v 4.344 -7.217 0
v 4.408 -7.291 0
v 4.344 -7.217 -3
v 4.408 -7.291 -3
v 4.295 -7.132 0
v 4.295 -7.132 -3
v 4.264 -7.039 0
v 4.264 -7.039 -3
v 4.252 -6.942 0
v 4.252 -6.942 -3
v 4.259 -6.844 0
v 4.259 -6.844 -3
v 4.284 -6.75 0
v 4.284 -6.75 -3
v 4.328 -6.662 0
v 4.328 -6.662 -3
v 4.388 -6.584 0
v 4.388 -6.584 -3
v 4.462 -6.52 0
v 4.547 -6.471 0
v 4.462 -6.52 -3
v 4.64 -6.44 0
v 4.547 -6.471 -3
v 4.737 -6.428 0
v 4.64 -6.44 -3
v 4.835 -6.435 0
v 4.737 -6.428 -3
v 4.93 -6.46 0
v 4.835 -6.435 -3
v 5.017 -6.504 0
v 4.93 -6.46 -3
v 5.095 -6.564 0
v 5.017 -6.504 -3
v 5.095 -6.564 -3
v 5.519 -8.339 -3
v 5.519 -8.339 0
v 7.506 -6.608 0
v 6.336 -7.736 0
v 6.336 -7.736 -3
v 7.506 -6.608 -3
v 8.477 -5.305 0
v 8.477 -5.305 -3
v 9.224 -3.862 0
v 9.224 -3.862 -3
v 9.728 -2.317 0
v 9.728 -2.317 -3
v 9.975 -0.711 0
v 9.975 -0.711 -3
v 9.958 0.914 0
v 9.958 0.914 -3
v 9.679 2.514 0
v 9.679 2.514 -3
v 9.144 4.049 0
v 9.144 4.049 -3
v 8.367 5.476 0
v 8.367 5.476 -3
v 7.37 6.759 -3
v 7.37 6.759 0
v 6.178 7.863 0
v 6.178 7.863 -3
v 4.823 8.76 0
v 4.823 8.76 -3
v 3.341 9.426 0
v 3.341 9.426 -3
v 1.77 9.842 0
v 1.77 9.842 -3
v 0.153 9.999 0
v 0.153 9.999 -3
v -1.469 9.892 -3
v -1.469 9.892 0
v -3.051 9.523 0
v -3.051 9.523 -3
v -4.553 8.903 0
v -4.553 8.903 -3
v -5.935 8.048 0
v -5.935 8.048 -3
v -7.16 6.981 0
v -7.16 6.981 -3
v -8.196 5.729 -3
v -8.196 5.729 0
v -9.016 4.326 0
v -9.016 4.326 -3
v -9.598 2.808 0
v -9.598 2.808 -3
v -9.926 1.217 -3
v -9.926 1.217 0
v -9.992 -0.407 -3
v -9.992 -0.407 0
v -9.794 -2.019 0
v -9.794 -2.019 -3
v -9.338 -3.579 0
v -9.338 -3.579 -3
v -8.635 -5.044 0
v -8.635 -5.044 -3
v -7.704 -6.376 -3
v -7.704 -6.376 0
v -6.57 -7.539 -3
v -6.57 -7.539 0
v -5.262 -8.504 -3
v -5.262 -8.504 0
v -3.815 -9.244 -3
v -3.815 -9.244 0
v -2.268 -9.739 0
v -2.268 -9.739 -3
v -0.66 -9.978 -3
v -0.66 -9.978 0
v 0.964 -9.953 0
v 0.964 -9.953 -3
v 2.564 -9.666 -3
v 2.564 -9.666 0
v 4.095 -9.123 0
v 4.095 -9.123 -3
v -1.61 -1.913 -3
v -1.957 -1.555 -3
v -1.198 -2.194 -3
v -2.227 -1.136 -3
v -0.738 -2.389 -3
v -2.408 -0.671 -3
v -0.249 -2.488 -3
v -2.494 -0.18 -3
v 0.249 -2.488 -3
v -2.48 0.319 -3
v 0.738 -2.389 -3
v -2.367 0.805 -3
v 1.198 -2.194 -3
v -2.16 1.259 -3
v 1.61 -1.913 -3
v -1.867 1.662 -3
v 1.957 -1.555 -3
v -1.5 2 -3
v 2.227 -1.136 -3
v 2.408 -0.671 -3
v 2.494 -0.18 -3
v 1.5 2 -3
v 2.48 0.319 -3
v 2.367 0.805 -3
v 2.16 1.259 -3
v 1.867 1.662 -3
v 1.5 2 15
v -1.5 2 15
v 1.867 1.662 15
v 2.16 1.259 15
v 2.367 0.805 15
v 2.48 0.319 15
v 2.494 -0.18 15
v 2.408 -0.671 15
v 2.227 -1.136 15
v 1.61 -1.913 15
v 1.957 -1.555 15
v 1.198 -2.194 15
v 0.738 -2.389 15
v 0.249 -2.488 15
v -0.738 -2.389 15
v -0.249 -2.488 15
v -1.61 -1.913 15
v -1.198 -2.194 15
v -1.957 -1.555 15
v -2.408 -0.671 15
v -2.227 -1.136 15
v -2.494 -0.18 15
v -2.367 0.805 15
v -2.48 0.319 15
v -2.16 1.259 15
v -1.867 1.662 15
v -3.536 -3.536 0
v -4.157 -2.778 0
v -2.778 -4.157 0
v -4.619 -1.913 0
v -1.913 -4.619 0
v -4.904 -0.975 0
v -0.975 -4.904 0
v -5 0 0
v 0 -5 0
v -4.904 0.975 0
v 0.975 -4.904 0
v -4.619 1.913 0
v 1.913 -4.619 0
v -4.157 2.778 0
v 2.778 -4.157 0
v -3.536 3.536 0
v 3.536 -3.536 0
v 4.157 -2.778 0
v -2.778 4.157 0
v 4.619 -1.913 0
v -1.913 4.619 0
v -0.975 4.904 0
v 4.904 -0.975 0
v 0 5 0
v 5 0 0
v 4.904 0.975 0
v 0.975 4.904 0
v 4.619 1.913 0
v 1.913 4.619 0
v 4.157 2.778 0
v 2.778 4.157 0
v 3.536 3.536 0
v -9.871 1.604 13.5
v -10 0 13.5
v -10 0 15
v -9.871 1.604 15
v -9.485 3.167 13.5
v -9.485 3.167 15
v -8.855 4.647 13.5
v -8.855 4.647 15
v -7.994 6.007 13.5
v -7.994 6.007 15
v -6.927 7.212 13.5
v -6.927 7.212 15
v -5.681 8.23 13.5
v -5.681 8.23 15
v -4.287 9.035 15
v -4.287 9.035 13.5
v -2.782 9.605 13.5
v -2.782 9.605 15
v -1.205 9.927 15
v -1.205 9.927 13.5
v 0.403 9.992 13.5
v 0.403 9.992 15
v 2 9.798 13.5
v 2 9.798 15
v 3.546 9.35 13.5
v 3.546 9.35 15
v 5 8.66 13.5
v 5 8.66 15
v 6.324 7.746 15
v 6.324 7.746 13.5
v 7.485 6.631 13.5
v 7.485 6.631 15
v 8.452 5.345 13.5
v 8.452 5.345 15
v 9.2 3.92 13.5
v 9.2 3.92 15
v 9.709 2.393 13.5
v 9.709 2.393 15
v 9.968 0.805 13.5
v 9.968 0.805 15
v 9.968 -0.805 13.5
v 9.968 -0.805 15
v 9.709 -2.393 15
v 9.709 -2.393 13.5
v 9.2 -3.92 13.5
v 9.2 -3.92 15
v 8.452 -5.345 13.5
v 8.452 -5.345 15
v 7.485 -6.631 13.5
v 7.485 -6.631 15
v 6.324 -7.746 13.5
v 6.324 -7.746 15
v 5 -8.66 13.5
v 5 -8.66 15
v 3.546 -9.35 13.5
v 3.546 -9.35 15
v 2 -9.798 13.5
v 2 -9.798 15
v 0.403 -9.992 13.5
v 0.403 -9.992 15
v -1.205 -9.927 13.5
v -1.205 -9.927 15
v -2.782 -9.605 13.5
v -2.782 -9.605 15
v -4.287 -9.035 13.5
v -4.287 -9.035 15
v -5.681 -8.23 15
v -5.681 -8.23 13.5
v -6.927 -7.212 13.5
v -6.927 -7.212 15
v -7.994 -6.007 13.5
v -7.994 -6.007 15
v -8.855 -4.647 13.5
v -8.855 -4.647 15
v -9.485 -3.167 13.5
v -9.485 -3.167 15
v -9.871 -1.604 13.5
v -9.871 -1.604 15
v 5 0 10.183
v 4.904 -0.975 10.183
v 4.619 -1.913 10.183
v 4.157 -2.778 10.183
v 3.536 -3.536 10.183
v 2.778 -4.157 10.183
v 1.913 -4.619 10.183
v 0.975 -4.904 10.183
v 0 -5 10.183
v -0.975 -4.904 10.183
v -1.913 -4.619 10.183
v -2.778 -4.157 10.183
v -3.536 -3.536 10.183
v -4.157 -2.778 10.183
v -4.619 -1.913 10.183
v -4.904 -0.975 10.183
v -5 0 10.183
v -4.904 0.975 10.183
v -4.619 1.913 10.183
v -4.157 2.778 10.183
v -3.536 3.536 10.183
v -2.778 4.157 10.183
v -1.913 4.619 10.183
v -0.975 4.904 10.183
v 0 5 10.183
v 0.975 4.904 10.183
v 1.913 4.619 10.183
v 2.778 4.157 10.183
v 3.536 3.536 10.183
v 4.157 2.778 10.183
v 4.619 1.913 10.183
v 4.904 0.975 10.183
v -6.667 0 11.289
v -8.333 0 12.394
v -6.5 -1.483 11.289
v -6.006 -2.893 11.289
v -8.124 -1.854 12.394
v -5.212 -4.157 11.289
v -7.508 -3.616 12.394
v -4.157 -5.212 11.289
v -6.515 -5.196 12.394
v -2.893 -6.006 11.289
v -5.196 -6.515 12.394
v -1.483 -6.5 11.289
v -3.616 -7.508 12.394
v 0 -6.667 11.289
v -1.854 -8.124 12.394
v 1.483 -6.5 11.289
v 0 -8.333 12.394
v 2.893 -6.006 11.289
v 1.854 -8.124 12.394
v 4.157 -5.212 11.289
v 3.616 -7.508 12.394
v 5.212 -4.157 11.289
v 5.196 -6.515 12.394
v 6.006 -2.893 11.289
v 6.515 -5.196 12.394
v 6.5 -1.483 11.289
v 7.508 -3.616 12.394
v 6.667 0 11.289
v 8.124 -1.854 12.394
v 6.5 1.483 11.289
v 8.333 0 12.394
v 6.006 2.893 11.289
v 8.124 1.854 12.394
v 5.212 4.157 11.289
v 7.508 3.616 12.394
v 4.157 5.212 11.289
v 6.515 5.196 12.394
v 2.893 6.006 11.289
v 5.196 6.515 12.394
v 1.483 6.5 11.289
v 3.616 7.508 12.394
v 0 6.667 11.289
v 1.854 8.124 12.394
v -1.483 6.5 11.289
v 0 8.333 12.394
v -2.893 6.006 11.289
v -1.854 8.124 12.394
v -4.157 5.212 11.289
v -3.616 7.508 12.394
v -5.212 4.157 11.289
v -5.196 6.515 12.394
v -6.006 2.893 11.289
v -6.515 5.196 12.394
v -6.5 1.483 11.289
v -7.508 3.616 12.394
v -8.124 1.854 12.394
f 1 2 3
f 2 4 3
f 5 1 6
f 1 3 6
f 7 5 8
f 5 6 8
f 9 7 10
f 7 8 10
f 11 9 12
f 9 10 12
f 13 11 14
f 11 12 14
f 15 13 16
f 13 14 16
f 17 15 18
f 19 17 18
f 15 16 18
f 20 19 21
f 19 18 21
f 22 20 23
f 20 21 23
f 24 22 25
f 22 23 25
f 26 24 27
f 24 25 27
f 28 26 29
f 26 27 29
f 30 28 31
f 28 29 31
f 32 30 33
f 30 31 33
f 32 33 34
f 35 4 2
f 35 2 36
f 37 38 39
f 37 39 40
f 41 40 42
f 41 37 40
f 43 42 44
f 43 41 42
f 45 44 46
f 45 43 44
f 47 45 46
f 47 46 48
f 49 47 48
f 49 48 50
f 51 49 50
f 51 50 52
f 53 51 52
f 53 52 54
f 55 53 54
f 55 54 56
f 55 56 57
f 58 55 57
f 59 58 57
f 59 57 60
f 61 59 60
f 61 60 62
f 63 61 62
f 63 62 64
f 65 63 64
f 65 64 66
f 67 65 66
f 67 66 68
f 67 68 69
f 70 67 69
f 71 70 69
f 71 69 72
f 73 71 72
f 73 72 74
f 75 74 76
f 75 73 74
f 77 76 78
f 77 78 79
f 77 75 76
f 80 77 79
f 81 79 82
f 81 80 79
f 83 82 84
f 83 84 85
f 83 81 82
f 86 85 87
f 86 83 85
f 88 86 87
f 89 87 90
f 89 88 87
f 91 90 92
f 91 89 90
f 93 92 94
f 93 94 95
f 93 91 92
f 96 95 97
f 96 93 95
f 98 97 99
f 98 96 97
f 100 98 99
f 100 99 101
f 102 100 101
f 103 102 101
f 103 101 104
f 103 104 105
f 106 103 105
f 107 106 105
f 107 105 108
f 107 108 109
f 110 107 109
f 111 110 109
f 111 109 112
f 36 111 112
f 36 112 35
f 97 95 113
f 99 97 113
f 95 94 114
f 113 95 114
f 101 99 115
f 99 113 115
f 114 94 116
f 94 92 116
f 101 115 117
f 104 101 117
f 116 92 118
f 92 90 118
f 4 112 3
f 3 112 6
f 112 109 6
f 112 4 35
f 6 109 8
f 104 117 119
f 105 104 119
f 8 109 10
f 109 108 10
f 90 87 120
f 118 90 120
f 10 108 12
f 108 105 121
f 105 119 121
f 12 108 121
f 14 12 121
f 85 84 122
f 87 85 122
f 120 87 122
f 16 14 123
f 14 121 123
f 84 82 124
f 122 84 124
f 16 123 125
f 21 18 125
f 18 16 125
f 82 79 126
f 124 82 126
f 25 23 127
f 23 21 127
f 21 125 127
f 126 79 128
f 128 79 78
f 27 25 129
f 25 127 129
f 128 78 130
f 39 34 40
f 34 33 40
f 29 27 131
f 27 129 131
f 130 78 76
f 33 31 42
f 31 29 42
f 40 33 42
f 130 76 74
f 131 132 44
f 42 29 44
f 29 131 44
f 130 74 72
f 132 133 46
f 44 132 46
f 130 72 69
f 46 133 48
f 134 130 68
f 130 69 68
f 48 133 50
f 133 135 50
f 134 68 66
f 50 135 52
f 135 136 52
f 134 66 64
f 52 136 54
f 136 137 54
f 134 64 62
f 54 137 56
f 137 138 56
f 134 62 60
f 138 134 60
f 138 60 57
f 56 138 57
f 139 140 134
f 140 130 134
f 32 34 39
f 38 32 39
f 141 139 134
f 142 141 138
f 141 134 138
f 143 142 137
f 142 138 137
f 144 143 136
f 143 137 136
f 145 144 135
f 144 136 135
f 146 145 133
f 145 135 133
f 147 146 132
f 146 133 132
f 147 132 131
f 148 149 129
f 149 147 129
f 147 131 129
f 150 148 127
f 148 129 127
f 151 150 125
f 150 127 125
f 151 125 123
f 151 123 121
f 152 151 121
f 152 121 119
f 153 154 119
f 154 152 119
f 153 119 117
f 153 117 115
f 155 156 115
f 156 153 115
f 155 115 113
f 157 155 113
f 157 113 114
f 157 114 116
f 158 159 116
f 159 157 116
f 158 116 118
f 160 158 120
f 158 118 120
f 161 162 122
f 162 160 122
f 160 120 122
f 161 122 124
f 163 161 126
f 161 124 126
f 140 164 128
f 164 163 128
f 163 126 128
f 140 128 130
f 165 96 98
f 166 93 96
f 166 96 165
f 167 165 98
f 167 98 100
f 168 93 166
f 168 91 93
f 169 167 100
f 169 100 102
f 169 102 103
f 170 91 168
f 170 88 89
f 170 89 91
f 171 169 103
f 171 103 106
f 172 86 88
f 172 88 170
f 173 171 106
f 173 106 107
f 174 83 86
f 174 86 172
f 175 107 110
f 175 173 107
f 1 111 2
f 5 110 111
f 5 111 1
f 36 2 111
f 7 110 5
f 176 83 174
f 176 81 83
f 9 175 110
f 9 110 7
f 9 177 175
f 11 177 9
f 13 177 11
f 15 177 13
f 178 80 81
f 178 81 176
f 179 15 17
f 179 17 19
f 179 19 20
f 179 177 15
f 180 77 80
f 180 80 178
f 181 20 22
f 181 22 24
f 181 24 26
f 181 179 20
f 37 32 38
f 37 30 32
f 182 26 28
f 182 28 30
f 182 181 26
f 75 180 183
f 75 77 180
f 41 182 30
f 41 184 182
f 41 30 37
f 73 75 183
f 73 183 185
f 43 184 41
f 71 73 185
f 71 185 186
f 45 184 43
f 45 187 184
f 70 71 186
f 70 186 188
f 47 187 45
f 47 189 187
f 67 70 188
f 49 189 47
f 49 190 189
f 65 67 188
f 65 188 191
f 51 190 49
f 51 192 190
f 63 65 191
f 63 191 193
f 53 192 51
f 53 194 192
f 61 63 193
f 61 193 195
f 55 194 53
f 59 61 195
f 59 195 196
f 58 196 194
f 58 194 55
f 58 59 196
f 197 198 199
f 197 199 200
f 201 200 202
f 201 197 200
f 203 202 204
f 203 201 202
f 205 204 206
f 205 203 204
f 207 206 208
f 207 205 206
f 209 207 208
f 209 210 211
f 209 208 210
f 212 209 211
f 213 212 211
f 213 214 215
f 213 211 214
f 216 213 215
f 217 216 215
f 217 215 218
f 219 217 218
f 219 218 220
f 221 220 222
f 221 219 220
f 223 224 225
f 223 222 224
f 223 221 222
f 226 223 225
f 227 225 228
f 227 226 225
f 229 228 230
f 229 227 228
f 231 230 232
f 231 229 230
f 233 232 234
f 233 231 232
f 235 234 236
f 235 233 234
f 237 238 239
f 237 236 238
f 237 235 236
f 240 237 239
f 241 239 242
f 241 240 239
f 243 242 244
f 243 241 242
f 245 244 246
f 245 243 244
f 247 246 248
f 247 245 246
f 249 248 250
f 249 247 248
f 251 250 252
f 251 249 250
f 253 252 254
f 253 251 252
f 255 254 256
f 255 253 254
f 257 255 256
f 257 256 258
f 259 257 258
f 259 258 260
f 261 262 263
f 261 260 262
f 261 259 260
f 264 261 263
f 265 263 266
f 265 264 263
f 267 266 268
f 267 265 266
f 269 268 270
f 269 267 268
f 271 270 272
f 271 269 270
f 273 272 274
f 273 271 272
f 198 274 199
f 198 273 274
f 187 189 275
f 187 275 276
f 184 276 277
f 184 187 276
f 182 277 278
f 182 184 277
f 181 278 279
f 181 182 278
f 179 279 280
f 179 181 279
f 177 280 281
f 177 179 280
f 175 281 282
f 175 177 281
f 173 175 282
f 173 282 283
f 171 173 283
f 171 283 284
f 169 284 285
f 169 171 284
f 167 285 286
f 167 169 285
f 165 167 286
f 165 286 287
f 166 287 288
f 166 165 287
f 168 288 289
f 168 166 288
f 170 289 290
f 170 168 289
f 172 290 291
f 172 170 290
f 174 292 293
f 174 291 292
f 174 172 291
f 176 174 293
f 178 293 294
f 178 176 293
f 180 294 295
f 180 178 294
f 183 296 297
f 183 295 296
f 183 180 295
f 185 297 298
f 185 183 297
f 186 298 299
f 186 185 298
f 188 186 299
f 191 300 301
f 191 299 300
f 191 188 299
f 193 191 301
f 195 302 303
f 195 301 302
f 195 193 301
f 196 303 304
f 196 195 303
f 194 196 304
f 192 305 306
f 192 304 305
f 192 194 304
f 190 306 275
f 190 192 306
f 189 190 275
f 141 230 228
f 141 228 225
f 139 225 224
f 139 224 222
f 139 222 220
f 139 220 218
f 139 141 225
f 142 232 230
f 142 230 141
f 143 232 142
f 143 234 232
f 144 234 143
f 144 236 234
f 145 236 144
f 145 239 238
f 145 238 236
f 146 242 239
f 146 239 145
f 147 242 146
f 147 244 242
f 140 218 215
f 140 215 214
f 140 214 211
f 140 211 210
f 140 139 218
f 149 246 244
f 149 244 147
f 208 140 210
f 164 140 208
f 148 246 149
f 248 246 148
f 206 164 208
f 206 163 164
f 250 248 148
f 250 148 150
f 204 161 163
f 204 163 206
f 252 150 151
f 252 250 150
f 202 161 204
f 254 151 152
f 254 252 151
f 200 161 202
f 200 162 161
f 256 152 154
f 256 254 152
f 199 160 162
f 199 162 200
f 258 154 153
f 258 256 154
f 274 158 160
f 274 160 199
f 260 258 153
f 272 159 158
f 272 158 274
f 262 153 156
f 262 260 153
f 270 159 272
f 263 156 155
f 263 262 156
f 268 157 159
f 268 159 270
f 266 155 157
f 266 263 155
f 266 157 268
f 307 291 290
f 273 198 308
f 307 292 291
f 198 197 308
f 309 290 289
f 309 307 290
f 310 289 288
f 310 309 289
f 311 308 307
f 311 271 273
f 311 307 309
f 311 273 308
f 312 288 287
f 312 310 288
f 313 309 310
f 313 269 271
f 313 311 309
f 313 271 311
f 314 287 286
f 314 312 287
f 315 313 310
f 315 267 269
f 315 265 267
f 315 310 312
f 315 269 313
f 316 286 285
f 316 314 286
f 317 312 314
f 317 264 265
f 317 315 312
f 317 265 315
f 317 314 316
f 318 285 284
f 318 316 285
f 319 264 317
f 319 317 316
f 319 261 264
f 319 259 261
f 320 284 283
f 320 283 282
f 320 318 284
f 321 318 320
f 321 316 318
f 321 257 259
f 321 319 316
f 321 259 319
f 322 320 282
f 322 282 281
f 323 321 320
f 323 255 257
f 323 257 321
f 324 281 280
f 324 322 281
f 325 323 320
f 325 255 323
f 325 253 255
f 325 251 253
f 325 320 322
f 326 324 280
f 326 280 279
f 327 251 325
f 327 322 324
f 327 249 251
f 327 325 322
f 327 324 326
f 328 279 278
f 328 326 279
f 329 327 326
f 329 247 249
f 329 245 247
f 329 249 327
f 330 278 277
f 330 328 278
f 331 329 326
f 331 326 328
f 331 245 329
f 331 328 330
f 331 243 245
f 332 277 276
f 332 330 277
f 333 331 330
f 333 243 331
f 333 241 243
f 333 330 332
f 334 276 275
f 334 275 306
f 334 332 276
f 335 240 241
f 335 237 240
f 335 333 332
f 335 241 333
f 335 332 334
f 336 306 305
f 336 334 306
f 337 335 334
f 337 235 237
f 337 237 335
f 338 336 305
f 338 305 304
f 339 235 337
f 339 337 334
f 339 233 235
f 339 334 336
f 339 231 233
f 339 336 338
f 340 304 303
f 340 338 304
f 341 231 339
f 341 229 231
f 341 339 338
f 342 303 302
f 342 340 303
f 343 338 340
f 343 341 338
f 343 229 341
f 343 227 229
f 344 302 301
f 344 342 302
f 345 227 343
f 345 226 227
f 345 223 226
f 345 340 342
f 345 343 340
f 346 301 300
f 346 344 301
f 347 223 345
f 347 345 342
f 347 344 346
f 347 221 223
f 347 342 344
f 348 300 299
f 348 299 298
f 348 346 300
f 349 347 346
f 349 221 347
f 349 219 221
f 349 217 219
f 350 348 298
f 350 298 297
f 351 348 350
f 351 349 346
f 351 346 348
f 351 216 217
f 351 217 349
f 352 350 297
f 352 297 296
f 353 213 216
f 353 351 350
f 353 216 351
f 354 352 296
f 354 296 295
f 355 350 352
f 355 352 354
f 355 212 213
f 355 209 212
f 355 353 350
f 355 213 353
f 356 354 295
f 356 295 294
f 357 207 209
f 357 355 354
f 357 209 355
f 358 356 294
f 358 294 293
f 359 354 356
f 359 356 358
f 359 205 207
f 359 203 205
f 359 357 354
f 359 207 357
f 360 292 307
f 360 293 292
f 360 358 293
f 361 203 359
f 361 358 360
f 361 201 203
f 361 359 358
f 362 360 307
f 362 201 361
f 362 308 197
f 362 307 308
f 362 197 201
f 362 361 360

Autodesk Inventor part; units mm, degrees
ref_plane "YZ Plane" through (0, 0, 0) normal (1, 0, 0) x (0, 1, 0)
ref_plane "XZ Plane" through (0, 0, 0) normal (0, 1, 0) x (-1, 0, 0)
ref_plane "XY Plane" through (0, 0, 0) normal (0, 0, 1) x (1, 0, 0)
sketch "Sketch1" plane through (0, 0, 0) normal (0, 0, 1) x (1, 0, 0)
  circle A0 centre (0, 0) radius 2.5
  line L0 (-1.5, 2) -> (1.5, 2)
  circle A1 centre (0, 0) radius 5
  circle A2 centre (0, 0) radius 10
  dimension "d0" = 5
  dimension "d1" = 2
  dimension "d2" = 10
  dimension "d16" = 20
extrude "Extrusion1" add sketch "Sketch1" along normal blind 15 contours L0 A0 | A1 picked at (-0.3466, 2.0912)
extrude "Extrusion2" add sketch "Sketch1" against normal blind 3 contours L0 A0 | A1 | A2 picked at (-0.3466, 2.0912)
ref_plane "Work Plane2" through (0, 0, 0) normal (0, -1, 0) x (1, 0, 0)
ref_plane "Work Plane1" through (0, 5, 0) normal (0, -1, 0) x (1, 0, 0)
sketch "Sketch4" plane through (0, 0, 0) normal (0, -1, 0) x (1, 0, 0)
  line L0 (5, 15) -> (-5, 15) projected
  line L1 (-5, 15) -> (-10, 15)
  line L2 (-10, 15) -> (-10, 13.5)
  line L3 (-5, 0) -> (-5, 15) projected
  line L4 (-10, 13.5) -> (-5, 10.1834)
  line L5 (0, -6.6) -> (0, 18.6) projected
  point P0 (0, 0)
  dimension "d10" = 5
  dimension "d11" = 1.5
  dimension "d14" = 6
revolve "Revolution1" add sketch "Sketch4" angle 360 about axis through (0, 0, -10) along (0, 0, 1)
sketch "Sketch6" plane through (0, 0, -3) normal (0, 0, -1) x (-1, 0, 0)
  circle A0 centre (0, 0) radius 10 projected
  circle A1 centre (-4.7517, -6.9277) radius 0.5
  line L0 (-5.0949, -6.5641) -> (-6.3365, -7.7362)
  line L1 (-4.4085, -7.2913) -> (-5.5187, -8.3393)
  dimension "d19" = 1
extrude "Extrusion3" cut sketch "Sketch6" against normal blind 3 contours L0 A1 L1 A0 | A1 picked at (-5.8735, -7.6008)
properties part number "D_coupler"
